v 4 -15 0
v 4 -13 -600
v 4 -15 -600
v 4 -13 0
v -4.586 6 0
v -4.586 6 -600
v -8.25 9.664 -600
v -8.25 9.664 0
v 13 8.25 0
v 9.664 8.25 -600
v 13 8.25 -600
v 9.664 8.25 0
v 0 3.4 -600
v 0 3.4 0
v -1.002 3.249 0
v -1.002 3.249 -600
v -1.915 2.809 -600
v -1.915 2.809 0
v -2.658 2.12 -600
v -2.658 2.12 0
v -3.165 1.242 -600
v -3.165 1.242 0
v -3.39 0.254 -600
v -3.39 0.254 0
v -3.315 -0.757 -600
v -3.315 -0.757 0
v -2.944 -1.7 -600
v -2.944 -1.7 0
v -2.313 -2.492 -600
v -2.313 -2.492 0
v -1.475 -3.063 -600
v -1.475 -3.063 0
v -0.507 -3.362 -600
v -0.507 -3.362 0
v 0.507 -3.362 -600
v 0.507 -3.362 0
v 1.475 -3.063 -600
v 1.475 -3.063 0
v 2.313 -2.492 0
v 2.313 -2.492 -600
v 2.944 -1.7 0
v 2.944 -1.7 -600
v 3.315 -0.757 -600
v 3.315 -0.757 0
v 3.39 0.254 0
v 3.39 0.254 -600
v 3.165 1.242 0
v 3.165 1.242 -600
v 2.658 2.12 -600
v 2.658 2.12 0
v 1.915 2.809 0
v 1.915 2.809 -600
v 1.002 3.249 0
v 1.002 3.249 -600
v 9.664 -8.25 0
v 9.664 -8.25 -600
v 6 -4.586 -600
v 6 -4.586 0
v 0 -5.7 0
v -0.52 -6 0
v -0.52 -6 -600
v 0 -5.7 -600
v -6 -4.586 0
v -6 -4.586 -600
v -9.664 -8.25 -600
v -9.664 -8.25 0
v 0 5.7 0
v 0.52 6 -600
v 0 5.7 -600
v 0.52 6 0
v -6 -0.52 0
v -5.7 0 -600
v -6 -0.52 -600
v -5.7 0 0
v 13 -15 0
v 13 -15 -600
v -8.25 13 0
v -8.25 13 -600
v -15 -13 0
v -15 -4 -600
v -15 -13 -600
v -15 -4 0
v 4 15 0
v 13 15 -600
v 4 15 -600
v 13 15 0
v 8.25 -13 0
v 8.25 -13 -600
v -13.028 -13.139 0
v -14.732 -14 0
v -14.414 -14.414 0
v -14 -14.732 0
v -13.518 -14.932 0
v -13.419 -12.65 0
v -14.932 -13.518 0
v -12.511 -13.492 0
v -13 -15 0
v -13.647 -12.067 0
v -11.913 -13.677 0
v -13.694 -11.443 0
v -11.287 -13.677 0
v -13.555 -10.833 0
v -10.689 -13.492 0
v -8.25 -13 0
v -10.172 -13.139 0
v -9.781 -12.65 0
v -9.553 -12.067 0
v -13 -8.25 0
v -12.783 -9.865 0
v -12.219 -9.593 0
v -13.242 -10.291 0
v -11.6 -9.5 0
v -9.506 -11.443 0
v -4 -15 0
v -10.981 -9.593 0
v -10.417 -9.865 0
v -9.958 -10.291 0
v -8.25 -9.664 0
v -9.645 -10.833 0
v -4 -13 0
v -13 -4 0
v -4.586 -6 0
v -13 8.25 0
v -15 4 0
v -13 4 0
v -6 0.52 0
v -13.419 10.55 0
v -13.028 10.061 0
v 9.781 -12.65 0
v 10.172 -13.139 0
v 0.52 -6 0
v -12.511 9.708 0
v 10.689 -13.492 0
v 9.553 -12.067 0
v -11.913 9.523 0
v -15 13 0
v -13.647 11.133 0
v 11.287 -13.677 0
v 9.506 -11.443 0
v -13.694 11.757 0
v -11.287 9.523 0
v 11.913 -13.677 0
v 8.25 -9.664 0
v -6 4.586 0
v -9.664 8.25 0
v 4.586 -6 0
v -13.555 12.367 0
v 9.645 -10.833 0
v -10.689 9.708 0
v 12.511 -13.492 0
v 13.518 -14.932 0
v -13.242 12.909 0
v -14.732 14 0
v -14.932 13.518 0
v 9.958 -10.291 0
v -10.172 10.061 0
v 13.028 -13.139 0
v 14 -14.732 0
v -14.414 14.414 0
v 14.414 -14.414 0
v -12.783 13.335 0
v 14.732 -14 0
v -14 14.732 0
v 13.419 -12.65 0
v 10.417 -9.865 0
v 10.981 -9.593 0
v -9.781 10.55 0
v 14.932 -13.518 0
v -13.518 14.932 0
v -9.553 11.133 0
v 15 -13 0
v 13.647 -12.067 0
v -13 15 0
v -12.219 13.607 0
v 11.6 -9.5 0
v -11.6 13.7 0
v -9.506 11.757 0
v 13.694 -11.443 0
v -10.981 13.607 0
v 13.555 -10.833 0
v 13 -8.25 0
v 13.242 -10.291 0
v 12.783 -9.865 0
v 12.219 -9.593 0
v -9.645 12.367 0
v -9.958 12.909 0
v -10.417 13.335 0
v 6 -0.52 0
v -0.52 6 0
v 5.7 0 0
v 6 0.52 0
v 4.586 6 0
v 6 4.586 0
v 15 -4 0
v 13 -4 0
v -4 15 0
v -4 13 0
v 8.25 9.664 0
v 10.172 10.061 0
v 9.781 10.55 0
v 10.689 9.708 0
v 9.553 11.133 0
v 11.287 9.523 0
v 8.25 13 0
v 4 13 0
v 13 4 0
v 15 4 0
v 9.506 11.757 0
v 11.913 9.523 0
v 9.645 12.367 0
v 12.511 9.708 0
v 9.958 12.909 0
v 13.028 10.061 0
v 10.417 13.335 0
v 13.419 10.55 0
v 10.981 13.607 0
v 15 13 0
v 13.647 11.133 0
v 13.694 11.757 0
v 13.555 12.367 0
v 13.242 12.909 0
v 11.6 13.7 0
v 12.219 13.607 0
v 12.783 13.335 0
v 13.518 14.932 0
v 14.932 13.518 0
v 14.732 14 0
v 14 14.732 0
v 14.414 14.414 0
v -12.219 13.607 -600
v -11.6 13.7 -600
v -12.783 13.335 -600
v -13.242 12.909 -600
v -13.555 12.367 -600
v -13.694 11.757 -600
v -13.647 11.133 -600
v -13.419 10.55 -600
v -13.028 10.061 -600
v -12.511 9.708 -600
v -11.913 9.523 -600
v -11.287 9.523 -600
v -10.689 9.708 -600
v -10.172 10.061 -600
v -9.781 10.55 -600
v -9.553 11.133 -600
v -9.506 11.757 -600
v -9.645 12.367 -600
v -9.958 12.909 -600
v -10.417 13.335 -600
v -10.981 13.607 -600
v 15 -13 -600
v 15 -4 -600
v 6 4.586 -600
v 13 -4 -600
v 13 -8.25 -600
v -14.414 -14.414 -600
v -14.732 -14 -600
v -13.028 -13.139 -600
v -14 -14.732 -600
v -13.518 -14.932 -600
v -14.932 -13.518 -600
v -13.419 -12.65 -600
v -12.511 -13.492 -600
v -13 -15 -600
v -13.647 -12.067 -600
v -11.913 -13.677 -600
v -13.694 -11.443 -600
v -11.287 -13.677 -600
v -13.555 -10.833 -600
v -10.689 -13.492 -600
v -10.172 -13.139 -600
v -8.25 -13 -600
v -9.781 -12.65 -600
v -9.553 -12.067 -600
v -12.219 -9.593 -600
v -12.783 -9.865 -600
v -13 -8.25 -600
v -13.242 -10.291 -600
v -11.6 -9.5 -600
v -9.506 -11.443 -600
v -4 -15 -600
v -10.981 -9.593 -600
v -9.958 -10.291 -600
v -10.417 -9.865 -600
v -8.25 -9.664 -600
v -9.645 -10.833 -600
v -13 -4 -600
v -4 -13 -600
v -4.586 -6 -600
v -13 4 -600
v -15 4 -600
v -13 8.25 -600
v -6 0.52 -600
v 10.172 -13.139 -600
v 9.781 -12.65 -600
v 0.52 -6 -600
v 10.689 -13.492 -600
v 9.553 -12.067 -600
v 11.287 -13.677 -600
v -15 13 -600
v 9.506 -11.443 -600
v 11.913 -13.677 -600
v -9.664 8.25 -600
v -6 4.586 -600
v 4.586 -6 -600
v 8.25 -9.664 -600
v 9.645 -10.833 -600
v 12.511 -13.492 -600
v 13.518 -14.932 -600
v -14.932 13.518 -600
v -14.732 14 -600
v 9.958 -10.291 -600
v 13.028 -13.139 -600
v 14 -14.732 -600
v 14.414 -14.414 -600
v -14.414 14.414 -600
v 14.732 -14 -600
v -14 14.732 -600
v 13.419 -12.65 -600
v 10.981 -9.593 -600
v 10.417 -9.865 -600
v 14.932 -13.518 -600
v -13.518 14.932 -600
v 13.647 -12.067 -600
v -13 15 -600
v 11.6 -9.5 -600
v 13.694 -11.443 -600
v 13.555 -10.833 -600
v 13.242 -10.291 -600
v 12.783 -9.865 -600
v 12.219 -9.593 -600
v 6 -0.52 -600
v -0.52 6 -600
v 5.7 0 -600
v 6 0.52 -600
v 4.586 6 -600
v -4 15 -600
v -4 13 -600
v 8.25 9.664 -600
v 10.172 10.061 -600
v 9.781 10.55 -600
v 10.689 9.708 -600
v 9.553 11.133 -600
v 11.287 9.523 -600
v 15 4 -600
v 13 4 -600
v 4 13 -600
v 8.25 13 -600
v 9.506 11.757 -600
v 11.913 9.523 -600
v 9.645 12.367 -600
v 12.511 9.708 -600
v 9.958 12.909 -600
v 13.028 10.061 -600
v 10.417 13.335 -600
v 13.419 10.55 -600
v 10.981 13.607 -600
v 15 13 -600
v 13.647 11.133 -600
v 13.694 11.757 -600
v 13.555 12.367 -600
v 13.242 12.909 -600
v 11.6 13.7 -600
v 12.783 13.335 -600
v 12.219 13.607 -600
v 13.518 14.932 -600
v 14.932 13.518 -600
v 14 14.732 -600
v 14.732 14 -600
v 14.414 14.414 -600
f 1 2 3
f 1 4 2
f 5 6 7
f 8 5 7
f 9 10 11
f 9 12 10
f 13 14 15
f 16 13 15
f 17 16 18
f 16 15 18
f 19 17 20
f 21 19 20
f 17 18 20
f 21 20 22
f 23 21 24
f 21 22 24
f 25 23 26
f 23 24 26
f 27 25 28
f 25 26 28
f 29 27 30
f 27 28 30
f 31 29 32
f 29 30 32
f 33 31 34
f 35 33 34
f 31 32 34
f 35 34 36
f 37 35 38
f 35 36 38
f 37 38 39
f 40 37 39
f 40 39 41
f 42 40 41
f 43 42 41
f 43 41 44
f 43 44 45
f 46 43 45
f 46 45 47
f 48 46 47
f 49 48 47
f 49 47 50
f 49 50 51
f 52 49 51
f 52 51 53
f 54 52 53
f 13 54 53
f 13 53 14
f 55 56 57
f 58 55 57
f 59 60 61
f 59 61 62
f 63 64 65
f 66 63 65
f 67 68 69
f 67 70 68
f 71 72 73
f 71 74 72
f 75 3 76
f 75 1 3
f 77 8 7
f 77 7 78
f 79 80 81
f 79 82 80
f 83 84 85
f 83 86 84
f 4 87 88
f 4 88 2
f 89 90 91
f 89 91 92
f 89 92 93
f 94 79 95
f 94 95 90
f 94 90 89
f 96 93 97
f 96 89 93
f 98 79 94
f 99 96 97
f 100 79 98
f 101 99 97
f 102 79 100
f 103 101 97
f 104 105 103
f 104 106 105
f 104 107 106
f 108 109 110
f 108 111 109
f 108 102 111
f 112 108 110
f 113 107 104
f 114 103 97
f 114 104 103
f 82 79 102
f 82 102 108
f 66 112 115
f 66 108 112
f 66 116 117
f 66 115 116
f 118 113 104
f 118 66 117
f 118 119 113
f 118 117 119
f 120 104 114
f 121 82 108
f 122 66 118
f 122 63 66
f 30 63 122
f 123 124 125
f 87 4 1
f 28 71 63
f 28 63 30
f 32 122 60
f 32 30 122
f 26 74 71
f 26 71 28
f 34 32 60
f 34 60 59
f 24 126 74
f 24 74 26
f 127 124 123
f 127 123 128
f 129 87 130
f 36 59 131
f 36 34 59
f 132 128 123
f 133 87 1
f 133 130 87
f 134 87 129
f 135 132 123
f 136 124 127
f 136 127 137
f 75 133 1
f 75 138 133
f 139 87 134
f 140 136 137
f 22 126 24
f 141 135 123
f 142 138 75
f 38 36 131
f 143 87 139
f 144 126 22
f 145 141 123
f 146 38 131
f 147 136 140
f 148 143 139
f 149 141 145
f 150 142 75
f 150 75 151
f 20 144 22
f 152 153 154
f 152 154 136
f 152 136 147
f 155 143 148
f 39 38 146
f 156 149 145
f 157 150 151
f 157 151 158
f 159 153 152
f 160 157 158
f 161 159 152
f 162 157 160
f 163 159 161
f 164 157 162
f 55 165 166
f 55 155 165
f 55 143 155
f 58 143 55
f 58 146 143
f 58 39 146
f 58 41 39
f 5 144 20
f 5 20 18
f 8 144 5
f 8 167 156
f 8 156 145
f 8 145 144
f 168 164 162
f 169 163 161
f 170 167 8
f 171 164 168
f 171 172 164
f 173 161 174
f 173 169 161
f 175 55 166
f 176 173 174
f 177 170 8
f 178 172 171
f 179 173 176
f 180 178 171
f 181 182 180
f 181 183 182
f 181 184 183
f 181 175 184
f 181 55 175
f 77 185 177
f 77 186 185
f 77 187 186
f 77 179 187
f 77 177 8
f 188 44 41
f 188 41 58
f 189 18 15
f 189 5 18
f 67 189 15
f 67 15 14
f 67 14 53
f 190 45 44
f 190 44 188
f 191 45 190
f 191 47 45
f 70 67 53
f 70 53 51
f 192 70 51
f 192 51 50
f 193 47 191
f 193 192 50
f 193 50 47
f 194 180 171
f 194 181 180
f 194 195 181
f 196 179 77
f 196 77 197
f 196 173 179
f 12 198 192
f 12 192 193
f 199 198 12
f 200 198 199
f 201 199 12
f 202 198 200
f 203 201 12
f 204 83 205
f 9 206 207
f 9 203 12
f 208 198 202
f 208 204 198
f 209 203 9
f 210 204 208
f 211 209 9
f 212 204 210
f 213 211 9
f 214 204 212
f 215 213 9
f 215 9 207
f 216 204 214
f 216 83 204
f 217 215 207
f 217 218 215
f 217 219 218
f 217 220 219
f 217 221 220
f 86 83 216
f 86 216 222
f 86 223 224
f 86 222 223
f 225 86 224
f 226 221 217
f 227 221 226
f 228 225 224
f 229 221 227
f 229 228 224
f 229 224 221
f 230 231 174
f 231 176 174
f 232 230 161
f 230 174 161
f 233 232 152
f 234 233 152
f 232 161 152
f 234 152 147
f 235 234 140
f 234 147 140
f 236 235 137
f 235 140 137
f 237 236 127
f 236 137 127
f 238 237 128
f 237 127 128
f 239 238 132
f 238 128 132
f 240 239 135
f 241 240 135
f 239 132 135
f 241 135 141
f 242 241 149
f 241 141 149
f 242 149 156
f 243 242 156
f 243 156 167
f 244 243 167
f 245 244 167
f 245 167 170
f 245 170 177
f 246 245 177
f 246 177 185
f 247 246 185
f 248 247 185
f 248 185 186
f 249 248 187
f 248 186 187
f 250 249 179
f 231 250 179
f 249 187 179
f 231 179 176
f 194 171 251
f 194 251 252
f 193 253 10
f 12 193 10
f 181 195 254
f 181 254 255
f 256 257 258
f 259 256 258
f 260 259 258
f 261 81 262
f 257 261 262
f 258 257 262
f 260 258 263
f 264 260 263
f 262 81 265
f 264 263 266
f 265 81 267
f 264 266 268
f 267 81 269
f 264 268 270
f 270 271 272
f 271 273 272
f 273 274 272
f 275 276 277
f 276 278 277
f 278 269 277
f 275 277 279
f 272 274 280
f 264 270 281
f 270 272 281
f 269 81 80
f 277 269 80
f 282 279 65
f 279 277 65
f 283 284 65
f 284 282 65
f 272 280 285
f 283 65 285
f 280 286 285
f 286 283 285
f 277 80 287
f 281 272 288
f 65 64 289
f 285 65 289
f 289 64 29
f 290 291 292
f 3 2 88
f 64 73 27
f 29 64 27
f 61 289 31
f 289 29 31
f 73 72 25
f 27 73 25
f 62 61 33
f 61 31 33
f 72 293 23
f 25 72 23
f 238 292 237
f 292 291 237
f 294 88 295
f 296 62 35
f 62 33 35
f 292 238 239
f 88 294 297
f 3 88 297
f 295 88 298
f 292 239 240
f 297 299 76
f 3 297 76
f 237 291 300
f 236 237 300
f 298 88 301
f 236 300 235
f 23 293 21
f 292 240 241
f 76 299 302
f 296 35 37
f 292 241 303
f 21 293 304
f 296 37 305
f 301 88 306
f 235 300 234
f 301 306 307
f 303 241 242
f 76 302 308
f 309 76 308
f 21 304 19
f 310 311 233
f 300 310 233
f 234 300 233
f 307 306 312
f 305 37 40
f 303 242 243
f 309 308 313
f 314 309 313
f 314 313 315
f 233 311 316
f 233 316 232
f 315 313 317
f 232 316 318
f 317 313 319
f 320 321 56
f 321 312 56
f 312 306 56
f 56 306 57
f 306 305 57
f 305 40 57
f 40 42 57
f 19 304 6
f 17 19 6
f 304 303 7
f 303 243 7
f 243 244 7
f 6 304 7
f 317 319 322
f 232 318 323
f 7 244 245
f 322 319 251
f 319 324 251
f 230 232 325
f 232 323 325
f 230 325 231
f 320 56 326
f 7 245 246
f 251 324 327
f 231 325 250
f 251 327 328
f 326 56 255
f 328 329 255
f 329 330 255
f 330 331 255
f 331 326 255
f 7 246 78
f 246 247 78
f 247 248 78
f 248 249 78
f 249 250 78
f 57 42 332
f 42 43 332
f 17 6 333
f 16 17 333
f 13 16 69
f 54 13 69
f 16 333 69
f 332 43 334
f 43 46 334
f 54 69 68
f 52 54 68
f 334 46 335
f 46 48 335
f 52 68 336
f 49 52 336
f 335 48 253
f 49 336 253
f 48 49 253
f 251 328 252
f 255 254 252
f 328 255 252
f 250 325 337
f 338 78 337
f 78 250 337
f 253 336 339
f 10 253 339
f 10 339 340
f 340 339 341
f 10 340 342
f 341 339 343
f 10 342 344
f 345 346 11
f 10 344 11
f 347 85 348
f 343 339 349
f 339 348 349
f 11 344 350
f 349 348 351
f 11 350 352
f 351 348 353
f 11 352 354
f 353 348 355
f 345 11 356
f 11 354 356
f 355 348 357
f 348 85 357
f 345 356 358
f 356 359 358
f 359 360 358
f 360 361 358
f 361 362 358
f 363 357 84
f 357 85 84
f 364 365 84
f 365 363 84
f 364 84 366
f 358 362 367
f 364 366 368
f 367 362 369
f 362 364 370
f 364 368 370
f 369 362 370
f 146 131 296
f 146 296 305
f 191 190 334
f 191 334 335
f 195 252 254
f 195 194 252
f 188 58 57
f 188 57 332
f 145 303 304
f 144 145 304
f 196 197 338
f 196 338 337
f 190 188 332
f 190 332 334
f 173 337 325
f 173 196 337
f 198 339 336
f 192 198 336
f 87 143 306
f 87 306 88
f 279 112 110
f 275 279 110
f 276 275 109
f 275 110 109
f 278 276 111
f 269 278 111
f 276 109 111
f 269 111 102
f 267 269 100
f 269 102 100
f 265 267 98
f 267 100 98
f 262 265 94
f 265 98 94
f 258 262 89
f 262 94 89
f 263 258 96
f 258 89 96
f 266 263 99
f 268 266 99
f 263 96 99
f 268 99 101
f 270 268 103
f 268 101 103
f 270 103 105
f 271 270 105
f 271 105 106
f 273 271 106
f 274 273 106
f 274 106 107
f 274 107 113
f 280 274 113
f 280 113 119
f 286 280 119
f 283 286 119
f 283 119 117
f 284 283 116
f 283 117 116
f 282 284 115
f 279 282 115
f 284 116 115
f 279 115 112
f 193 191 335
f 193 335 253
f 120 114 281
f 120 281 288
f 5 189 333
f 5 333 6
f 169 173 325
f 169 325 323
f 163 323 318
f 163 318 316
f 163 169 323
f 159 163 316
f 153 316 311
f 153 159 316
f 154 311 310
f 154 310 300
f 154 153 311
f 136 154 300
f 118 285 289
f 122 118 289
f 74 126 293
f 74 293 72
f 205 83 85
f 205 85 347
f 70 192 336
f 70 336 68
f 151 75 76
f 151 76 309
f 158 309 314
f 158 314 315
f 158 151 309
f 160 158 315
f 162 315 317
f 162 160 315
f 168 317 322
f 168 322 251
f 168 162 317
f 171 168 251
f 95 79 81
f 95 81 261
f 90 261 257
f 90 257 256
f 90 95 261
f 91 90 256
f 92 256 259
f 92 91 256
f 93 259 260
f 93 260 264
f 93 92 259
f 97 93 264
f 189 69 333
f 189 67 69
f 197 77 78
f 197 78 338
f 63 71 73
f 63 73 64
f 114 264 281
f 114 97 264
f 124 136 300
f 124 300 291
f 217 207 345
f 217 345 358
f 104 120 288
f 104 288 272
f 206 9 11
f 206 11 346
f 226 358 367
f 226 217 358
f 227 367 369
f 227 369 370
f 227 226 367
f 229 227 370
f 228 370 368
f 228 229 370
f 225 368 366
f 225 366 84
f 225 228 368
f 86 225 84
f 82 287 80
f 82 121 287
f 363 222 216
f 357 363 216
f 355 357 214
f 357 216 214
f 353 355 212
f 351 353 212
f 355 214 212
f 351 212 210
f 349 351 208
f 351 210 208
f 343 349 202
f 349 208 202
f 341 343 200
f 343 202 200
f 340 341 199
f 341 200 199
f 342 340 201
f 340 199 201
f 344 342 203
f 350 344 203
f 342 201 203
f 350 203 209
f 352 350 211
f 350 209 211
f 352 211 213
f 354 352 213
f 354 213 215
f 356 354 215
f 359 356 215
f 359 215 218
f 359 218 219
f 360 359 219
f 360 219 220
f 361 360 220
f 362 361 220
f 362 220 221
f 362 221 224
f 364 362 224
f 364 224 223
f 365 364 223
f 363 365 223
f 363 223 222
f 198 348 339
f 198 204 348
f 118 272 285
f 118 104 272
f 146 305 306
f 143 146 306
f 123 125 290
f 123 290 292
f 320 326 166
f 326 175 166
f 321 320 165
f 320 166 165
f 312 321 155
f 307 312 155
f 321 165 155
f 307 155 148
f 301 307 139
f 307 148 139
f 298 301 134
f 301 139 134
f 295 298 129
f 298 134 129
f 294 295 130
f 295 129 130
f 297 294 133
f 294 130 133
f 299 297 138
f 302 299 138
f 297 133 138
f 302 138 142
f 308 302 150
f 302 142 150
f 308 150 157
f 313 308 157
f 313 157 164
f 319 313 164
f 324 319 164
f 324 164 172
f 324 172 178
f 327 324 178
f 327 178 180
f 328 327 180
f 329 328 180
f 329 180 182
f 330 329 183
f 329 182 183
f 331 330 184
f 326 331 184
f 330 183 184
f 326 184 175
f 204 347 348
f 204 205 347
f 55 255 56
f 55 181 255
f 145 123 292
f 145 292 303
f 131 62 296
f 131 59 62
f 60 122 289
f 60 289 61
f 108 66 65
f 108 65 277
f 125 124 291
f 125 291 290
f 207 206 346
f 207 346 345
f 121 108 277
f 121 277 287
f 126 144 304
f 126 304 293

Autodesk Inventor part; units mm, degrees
sketch "Sketch_1" plane through (0, 0, 0) normal (0, 0, 1) x (1, 0, 0)
  line L0 (-15, 4) -> (-13, 4)
  line L1 (-13, 4) -> (-13, 8.25)
  line L2 (-13, 8.25) -> (-9.6642, 8.25)
  line L3 (-9.6642, 8.25) -> (-6, 4.5858)
  line L4 (-6, 4.5858) -> (-6, 0.5196)
  line L5 (-6, 0.5196) -> (-5.7, 0)
  line L6 (-5.7, 0) -> (-6, -0.5196)
  line L7 (-6, -0.5196) -> (-6, -4.5858)
  line L8 (-6, -4.5858) -> (-9.6642, -8.25)
  line L9 (-9.6642, -8.25) -> (-13, -8.25)
  line L10 (-13, -8.25) -> (-13, -4)
  line L11 (-13, -4) -> (-15, -4)
  line L12 (-15, -4) -> (-15, -13)
  arc A0 (-15, -13) -> (-13, -15) centre (-13, -13) ccw
  line L13 (-13, -15) -> (-4, -15)
  line L14 (-4, -15) -> (-4, -13)
  line L15 (-4, -13) -> (-8.25, -13)
  line L16 (-8.25, -13) -> (-8.25, -9.6642)
  line L17 (-8.25, -9.6642) -> (-4.5858, -6)
  line L18 (-4.5858, -6) -> (-0.5196, -6)
  line L19 (-0.5196, -6) -> (0, -5.7)
  line L20 (0, -5.7) -> (0.5196, -6)
  line L21 (0.5196, -6) -> (4.5858, -6)
  line L22 (4.5858, -6) -> (8.25, -9.6642)
  line L23 (8.25, -9.6642) -> (8.25, -13)
  line L24 (8.25, -13) -> (4, -13)
  line L25 (4, -13) -> (4, -15)
  line L26 (4, -15) -> (13, -15)
  arc A1 (13, -15) -> (15, -13) centre (13, -13) ccw
  line L27 (15, -13) -> (15, -4)
  line L28 (15, -4) -> (13, -4)
  line L29 (13, -4) -> (13, -8.25)
  line L30 (13, -8.25) -> (9.6642, -8.25)
  line L31 (9.6642, -8.25) -> (6, -4.5858)
  line L32 (6, -4.5858) -> (6, -0.5196)
  line L33 (6, -0.5196) -> (5.7, 0)
  line L34 (5.7, 0) -> (6, 0.5196)
  line L35 (6, 0.5196) -> (6, 4.5858)
  line L36 (6, 4.5858) -> (9.6642, 8.25)
  line L37 (9.6642, 8.25) -> (13, 8.25)
  line L38 (13, 8.25) -> (13, 4)
  line L39 (13, 4) -> (15, 4)
  line L40 (15, 4) -> (15, 13)
  arc A2 (15, 13) -> (13, 15) centre (13, 13) ccw
  line L41 (13, 15) -> (4, 15)
  line L42 (4, 15) -> (4, 13)
  line L43 (4, 13) -> (8.25, 13)
  line L44 (8.25, 13) -> (8.25, 9.6642)
  line L45 (8.25, 9.6642) -> (4.5858, 6)
  line L46 (4.5858, 6) -> (0.5196, 6)
  line L47 (0.5196, 6) -> (0, 5.7)
  line L48 (0, 5.7) -> (-0.5196, 6)
  line L49 (-0.5196, 6) -> (-4.5858, 6)
  line L50 (-4.5858, 6) -> (-8.25, 9.6642)
  line L51 (-8.25, 9.6642) -> (-8.25, 13)
  line L52 (-8.25, 13) -> (-4, 13)
  line L53 (-4, 13) -> (-4, 15)
  line L54 (-4, 15) -> (-13, 15)
  arc A3 (-13, 15) -> (-15, 13) centre (-13, 13) ccw
  line L55 (-15, 13) -> (-15, 4)
extrude "Extrusion1" add sketch "Sketch_1" against normal blind 600
sketch "Sketch2" plane through (0, 0, -600) normal (0, 0, -1) x (-1, 0, 0)
  point P0 (0, 0)
hole "Hole1" at (0, 0, -600) direction (0, 0, 1) diameter 6.8 depth 600
sketch "Sketch3" plane through (0, 0, -600) normal (0, 0, -1) x (-1, 0, 0)
  point P0 (-11.6, 11.6)
hole "Hole2" at (11.6, 11.6, -600) direction (0, 0, 1) diameter 4.2 depth 600
pattern_linear "Rectangular Pattern1" count 2 spacing 23.2 along (-1, 0, 0) count 2 spacing 23.2 along (0, -1, 0) of "Hole2"
ref_plane "C1_XY" through (0, 0, 0) normal (0, 0, 1) x (1, 0, 0)
ref_plane "C1_YZ" through (0, 0, 0) normal (1, 0, 0) x (0, 1, 0)
ref_plane "C1_ZX" through (0, 0, 0) normal (0, 1, 0) x (0, 0, 1)
ref_plane "to_frame_cap1_XY" through (0, 0, 0) normal (0, 0, 1) x (1, 0, 0)
ref_plane "to_frame_cap1_YZ" through (0, 0, 0) normal (1, 0, 0) x (0, 1, 0)
ref_plane "to_frame_cap1_ZX" through (0, 0, 0) normal (0, 1, 0) x (0, 0, 1)
ref_plane "to_frame_cap2_XY" through (0, 0, -600) normal (0, 0, -1) x (1, 0, 0)
ref_plane "to_frame_cap2_YZ" through (0, 0, -600) normal (1, 0, 0) x (0, -1, 0)
ref_plane "to_frame_cap2_ZX" through (0, 0, -600) normal (0, -1, 0) x (0, 0, -1)
properties part number "HFS6-3030-600"
